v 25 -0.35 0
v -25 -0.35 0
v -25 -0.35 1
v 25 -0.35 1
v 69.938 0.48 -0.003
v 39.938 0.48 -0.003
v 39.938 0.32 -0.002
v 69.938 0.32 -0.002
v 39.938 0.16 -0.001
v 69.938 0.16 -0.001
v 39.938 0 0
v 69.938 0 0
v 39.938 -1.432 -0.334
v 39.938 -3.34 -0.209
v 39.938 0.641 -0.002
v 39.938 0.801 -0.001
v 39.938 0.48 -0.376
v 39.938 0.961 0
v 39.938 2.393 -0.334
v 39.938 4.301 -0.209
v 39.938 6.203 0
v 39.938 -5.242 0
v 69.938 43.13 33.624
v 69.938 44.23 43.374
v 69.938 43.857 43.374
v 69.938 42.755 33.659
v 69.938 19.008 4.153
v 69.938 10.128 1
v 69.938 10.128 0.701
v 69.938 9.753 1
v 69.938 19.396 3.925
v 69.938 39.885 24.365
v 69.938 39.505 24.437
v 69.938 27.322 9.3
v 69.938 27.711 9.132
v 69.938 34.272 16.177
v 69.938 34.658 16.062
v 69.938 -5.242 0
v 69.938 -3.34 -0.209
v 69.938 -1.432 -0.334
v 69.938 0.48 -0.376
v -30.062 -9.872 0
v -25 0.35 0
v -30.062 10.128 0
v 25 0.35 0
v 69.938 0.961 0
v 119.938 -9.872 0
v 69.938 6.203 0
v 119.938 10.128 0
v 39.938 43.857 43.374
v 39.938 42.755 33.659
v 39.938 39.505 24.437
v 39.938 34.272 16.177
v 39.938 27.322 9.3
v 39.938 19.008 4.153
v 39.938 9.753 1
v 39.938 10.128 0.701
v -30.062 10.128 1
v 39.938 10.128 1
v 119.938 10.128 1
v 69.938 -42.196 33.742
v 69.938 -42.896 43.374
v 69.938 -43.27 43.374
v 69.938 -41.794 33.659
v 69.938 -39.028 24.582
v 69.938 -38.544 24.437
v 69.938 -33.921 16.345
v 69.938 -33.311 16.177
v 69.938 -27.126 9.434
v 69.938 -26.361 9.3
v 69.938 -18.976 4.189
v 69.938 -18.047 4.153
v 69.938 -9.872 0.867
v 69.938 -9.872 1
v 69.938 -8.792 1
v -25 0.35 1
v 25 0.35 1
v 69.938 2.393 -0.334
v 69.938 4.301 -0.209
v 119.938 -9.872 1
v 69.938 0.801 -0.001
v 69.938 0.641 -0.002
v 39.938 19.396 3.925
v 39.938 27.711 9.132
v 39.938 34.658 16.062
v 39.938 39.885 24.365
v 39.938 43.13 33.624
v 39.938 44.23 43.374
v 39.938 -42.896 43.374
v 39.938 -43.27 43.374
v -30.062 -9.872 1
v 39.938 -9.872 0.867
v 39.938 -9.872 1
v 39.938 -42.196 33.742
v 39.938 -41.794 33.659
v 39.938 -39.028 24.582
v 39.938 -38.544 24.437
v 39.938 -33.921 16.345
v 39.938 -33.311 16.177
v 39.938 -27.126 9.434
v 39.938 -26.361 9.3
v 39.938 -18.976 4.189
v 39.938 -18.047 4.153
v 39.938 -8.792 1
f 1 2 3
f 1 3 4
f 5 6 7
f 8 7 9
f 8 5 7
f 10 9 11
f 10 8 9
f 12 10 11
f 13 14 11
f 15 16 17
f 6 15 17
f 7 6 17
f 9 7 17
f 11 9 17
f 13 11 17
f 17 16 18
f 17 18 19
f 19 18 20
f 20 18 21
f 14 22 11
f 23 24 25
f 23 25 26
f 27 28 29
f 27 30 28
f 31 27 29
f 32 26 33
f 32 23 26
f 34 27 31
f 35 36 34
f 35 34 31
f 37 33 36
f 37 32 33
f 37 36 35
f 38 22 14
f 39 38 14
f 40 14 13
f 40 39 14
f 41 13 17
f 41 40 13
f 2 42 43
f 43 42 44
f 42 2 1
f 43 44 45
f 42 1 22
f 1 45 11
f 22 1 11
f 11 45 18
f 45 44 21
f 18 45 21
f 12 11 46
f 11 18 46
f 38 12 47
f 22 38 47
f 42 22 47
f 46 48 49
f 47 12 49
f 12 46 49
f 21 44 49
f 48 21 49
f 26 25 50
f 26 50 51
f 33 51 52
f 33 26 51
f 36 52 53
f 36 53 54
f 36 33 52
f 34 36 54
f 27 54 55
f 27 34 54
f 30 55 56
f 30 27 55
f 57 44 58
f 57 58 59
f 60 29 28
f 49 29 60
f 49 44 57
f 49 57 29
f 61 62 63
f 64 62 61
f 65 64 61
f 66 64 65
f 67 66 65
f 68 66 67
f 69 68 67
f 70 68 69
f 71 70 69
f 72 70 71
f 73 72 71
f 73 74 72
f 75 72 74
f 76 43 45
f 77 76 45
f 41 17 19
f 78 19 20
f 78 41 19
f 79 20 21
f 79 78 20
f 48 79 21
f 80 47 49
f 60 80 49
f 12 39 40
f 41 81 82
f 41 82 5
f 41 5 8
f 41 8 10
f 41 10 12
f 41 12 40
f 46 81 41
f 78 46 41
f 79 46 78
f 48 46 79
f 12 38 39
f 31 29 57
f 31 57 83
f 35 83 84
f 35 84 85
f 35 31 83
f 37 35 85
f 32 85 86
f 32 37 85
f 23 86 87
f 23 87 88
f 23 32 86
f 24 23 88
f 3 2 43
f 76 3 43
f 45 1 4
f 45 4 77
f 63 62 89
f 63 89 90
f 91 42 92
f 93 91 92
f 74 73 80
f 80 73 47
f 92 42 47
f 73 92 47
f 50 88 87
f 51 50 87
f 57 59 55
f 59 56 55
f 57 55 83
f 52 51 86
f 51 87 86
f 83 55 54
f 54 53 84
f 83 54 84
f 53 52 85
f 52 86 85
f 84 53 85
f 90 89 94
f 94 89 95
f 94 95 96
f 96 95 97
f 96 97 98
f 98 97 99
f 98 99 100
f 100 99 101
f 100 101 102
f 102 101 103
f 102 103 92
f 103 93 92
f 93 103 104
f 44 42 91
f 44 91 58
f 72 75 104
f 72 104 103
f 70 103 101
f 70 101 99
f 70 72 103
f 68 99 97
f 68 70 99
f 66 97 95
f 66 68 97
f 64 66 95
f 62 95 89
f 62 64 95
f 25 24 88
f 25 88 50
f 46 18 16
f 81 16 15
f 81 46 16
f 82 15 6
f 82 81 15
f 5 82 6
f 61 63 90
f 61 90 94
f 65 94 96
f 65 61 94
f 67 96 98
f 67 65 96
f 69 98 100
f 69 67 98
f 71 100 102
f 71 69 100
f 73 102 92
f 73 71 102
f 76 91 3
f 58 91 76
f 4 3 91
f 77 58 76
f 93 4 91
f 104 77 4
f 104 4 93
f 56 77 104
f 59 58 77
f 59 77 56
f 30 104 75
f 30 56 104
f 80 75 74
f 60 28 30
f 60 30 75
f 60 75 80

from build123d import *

# Parameters (mm, degrees)
SZKIC4_W                    = 150
SZKIC4_H                    = 20
SZKIC4_W_2                  = 50
SZKIC4_H_2                  = 0.7
DODANIE_WYCI_GNI_CIE1_DEPTH = 1
DODANIE_WYCI_GNI_CIE2_DEPTH = 30


with BuildPart() as part:
    # Szkic4 → Dodanie-wyciągnięcie1 (new body)
    with BuildSketch(Plane.XY):
        with Locations((44.938160122, 0.128489408)):
            Rectangle(SZKIC4_W, SZKIC4_H)
        Rectangle(SZKIC4_W_2, SZKIC4_H_2, mode=Mode.SUBTRACT)
    extrude(amount=DODANIE_WYCI_GNI_CIE1_DEPTH)

    # Szkic8 → Dodanie-wyciągnięcie2 (add)
    with BuildSketch(Plane(origin=(69.938160122, 0, 0), x_dir=(0, 0, -1), z_dir=(1, 0, 0))):
        with BuildLine():
            ThreePointArc((0.375817697, 0.480392187), (-12.438260626, 31.416313864), (-43.374182303, 44.230392187))
            Line((-43.374182303, 44.230392187), (-43.374182303, 43.857234708))
            ThreePointArc((-43.374182303, 43.857234708), (-12.70212281, 31.15245168), (0.002660218, 0.480392187))
            ThreePointArc((0.002660218, 0.480392187), (-12.70212281, -30.191667306), (-43.374182303, -42.896450334))
            Line((-43.374182303, -42.896450334), (-43.374182303, -43.269607813))
            ThreePointArc((-43.374182303, -43.269607813), (-12.438260626, -30.45552949), (0.375817697, 0.480392187))
        make_face()
    extrude(amount=-DODANIE_WYCI_GNI_CIE2_DEPTH)


solid = part.part
